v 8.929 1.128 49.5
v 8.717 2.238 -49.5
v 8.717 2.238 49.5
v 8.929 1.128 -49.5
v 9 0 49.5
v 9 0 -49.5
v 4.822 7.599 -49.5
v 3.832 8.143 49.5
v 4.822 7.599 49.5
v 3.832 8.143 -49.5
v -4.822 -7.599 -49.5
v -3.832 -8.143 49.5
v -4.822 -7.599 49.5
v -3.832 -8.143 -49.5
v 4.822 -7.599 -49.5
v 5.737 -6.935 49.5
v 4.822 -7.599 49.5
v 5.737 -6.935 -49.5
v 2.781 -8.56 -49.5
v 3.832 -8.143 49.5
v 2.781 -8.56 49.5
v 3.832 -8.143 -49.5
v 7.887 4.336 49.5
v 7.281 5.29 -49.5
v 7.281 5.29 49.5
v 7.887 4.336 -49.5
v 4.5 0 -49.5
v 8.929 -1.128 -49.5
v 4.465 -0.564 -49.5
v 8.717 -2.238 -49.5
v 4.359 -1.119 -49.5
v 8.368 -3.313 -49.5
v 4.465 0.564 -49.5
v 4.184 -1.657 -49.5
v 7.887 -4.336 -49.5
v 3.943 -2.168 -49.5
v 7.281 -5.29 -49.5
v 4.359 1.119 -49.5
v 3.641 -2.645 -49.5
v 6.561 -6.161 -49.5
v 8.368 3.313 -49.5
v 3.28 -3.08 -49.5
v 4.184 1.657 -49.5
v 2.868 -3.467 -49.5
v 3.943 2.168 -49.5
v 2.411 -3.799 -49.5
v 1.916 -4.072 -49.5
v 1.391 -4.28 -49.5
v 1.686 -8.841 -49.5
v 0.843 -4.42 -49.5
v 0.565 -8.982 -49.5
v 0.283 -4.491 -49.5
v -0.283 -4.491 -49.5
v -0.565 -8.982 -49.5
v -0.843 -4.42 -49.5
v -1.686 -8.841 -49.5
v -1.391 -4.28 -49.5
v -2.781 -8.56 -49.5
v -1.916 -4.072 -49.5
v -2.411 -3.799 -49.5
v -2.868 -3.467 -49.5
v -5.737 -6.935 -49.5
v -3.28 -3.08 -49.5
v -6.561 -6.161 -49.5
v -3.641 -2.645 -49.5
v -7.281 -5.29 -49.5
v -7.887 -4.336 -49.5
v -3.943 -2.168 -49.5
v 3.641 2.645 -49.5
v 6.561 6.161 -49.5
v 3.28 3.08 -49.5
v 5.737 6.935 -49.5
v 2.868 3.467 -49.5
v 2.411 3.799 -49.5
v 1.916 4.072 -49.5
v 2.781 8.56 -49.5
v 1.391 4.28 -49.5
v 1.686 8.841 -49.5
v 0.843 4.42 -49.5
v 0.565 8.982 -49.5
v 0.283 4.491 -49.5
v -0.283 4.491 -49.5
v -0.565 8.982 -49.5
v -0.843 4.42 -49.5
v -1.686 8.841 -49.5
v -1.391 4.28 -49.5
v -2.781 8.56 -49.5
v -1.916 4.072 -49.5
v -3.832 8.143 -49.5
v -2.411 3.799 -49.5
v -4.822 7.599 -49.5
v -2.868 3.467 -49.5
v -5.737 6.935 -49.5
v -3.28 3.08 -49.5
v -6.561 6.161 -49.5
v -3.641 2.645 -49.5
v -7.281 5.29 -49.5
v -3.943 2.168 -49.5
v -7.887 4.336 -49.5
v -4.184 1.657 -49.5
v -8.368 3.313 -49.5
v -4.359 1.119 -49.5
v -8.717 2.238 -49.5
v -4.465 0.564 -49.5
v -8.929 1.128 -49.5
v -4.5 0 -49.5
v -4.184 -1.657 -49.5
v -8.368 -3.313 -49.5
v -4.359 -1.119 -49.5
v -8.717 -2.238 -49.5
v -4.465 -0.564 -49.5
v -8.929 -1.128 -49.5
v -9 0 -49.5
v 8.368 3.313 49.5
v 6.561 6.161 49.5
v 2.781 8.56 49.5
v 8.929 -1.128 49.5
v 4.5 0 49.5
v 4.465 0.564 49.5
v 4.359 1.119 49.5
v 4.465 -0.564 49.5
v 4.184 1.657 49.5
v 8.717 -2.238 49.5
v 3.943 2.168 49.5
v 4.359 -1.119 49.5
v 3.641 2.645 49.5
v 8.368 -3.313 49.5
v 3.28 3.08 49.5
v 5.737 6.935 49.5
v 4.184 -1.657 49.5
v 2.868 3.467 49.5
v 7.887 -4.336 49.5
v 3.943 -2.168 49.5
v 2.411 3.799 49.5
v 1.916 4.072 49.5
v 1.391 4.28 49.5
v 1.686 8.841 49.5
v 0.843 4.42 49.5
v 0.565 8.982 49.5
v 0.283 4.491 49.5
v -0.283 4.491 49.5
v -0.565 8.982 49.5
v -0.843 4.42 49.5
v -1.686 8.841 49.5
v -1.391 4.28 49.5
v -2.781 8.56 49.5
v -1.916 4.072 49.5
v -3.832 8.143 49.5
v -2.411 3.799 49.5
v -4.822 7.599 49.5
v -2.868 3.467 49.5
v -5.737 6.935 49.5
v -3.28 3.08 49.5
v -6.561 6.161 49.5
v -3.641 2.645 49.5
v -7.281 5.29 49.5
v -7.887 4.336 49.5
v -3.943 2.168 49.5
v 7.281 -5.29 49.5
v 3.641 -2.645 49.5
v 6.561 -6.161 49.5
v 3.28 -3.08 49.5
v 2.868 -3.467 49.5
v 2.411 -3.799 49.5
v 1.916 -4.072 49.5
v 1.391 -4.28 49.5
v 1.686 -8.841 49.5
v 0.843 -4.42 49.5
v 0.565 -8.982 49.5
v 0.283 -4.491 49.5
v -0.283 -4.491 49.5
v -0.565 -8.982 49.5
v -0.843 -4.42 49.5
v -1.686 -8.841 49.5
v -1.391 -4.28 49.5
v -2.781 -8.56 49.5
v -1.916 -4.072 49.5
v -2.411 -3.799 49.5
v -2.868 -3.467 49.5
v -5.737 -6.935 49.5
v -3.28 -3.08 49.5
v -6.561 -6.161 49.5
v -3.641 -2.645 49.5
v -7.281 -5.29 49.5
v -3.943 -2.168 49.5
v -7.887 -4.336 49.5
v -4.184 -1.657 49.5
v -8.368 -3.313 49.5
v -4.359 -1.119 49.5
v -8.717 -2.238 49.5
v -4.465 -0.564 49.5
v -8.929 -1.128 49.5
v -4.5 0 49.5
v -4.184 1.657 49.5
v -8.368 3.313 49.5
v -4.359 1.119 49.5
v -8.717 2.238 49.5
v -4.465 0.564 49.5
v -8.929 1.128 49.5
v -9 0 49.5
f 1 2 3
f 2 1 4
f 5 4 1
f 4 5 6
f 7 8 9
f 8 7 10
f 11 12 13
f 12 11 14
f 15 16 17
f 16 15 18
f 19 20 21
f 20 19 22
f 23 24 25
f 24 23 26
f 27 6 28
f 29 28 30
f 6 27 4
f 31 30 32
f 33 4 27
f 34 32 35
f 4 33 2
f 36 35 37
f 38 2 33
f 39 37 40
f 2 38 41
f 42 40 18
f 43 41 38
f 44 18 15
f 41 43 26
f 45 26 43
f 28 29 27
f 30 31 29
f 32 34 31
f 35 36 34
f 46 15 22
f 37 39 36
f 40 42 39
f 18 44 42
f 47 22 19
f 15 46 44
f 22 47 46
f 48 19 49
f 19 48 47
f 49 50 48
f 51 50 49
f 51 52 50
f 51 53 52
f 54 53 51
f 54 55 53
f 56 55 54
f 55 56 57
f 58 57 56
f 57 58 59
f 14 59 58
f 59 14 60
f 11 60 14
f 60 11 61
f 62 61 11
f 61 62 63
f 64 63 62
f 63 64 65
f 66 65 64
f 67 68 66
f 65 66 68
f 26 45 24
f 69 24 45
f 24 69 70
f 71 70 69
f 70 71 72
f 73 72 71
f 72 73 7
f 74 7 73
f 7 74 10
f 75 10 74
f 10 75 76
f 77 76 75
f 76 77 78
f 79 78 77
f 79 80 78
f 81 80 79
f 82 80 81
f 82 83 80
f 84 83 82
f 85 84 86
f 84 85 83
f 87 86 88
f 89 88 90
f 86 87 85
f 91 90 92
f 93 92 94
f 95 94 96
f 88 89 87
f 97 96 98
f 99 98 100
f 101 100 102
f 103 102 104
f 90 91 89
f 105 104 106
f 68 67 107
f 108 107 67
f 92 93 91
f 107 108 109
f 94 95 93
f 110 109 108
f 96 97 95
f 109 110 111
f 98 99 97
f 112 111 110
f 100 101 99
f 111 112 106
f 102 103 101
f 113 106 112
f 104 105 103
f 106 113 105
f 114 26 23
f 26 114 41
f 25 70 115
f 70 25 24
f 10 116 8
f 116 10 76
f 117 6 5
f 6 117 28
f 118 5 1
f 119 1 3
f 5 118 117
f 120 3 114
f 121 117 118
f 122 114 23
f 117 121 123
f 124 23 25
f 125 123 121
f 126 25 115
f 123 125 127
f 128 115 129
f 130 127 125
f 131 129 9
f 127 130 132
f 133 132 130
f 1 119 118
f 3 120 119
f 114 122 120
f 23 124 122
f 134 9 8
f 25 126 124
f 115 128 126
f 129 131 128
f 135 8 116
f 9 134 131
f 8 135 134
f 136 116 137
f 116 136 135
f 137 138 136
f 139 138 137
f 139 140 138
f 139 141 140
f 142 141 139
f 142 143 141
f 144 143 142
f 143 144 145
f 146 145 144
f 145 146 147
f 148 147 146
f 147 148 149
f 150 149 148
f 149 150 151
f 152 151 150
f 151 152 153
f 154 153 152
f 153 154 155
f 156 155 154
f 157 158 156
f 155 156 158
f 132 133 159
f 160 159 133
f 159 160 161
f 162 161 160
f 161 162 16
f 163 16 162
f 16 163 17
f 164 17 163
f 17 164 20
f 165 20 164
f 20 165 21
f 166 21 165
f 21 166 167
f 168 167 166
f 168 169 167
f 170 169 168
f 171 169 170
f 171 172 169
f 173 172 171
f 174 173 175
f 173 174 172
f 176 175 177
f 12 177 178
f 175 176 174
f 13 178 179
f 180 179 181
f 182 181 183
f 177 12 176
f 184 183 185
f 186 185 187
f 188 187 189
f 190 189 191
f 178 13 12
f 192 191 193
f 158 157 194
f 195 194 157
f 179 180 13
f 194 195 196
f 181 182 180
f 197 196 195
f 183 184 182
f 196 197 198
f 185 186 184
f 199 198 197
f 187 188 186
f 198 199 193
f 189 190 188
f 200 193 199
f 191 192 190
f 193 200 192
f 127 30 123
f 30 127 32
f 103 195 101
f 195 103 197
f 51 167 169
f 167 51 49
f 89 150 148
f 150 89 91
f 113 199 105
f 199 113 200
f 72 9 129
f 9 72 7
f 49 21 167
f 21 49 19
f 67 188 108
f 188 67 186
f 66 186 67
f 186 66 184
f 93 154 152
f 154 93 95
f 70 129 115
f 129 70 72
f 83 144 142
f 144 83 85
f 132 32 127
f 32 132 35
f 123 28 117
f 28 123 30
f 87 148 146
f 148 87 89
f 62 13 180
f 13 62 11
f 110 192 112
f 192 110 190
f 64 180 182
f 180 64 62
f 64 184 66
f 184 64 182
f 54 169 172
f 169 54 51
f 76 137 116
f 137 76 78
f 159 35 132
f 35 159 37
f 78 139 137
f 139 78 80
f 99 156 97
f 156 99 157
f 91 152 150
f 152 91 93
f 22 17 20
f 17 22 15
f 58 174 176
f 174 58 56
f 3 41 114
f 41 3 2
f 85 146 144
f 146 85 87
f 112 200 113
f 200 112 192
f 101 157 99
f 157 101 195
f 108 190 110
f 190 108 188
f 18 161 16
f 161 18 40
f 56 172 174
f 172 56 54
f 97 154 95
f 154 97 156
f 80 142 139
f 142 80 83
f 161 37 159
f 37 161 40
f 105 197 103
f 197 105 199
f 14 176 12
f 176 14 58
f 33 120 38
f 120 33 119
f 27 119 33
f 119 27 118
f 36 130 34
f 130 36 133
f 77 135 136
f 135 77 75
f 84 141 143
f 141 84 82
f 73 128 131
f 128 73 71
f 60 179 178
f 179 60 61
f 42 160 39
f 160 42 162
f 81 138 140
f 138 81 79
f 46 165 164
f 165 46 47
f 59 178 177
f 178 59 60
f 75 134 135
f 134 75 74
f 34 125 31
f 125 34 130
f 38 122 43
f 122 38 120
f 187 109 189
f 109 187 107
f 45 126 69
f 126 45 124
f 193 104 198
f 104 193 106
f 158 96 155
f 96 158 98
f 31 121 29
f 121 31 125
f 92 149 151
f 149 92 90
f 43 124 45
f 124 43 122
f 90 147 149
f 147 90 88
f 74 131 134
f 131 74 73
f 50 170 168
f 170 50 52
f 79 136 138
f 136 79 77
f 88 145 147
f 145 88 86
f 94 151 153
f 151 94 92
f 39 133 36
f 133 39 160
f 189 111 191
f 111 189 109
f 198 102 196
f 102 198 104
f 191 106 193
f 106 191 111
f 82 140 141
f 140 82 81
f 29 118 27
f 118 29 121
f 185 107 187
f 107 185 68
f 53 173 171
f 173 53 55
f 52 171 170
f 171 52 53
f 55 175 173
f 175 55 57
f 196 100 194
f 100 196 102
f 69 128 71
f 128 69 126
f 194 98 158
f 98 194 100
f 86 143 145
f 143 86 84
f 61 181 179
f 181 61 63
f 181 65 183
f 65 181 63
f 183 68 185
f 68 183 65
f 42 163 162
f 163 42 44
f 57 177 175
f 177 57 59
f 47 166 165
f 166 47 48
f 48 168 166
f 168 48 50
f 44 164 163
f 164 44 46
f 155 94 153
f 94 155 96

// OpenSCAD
$fn = 50;


difference() {
	union() {
		translate(v = [0, 0, -49.5000000000]) {
			cylinder(h = 99, r = 9.0000000000);
		}
	}
	union() {
		translate(v = [0, 0, -100.0000000000]) {
			cylinder(h = 200, r = 4.5000000000);
		}
	}
}
